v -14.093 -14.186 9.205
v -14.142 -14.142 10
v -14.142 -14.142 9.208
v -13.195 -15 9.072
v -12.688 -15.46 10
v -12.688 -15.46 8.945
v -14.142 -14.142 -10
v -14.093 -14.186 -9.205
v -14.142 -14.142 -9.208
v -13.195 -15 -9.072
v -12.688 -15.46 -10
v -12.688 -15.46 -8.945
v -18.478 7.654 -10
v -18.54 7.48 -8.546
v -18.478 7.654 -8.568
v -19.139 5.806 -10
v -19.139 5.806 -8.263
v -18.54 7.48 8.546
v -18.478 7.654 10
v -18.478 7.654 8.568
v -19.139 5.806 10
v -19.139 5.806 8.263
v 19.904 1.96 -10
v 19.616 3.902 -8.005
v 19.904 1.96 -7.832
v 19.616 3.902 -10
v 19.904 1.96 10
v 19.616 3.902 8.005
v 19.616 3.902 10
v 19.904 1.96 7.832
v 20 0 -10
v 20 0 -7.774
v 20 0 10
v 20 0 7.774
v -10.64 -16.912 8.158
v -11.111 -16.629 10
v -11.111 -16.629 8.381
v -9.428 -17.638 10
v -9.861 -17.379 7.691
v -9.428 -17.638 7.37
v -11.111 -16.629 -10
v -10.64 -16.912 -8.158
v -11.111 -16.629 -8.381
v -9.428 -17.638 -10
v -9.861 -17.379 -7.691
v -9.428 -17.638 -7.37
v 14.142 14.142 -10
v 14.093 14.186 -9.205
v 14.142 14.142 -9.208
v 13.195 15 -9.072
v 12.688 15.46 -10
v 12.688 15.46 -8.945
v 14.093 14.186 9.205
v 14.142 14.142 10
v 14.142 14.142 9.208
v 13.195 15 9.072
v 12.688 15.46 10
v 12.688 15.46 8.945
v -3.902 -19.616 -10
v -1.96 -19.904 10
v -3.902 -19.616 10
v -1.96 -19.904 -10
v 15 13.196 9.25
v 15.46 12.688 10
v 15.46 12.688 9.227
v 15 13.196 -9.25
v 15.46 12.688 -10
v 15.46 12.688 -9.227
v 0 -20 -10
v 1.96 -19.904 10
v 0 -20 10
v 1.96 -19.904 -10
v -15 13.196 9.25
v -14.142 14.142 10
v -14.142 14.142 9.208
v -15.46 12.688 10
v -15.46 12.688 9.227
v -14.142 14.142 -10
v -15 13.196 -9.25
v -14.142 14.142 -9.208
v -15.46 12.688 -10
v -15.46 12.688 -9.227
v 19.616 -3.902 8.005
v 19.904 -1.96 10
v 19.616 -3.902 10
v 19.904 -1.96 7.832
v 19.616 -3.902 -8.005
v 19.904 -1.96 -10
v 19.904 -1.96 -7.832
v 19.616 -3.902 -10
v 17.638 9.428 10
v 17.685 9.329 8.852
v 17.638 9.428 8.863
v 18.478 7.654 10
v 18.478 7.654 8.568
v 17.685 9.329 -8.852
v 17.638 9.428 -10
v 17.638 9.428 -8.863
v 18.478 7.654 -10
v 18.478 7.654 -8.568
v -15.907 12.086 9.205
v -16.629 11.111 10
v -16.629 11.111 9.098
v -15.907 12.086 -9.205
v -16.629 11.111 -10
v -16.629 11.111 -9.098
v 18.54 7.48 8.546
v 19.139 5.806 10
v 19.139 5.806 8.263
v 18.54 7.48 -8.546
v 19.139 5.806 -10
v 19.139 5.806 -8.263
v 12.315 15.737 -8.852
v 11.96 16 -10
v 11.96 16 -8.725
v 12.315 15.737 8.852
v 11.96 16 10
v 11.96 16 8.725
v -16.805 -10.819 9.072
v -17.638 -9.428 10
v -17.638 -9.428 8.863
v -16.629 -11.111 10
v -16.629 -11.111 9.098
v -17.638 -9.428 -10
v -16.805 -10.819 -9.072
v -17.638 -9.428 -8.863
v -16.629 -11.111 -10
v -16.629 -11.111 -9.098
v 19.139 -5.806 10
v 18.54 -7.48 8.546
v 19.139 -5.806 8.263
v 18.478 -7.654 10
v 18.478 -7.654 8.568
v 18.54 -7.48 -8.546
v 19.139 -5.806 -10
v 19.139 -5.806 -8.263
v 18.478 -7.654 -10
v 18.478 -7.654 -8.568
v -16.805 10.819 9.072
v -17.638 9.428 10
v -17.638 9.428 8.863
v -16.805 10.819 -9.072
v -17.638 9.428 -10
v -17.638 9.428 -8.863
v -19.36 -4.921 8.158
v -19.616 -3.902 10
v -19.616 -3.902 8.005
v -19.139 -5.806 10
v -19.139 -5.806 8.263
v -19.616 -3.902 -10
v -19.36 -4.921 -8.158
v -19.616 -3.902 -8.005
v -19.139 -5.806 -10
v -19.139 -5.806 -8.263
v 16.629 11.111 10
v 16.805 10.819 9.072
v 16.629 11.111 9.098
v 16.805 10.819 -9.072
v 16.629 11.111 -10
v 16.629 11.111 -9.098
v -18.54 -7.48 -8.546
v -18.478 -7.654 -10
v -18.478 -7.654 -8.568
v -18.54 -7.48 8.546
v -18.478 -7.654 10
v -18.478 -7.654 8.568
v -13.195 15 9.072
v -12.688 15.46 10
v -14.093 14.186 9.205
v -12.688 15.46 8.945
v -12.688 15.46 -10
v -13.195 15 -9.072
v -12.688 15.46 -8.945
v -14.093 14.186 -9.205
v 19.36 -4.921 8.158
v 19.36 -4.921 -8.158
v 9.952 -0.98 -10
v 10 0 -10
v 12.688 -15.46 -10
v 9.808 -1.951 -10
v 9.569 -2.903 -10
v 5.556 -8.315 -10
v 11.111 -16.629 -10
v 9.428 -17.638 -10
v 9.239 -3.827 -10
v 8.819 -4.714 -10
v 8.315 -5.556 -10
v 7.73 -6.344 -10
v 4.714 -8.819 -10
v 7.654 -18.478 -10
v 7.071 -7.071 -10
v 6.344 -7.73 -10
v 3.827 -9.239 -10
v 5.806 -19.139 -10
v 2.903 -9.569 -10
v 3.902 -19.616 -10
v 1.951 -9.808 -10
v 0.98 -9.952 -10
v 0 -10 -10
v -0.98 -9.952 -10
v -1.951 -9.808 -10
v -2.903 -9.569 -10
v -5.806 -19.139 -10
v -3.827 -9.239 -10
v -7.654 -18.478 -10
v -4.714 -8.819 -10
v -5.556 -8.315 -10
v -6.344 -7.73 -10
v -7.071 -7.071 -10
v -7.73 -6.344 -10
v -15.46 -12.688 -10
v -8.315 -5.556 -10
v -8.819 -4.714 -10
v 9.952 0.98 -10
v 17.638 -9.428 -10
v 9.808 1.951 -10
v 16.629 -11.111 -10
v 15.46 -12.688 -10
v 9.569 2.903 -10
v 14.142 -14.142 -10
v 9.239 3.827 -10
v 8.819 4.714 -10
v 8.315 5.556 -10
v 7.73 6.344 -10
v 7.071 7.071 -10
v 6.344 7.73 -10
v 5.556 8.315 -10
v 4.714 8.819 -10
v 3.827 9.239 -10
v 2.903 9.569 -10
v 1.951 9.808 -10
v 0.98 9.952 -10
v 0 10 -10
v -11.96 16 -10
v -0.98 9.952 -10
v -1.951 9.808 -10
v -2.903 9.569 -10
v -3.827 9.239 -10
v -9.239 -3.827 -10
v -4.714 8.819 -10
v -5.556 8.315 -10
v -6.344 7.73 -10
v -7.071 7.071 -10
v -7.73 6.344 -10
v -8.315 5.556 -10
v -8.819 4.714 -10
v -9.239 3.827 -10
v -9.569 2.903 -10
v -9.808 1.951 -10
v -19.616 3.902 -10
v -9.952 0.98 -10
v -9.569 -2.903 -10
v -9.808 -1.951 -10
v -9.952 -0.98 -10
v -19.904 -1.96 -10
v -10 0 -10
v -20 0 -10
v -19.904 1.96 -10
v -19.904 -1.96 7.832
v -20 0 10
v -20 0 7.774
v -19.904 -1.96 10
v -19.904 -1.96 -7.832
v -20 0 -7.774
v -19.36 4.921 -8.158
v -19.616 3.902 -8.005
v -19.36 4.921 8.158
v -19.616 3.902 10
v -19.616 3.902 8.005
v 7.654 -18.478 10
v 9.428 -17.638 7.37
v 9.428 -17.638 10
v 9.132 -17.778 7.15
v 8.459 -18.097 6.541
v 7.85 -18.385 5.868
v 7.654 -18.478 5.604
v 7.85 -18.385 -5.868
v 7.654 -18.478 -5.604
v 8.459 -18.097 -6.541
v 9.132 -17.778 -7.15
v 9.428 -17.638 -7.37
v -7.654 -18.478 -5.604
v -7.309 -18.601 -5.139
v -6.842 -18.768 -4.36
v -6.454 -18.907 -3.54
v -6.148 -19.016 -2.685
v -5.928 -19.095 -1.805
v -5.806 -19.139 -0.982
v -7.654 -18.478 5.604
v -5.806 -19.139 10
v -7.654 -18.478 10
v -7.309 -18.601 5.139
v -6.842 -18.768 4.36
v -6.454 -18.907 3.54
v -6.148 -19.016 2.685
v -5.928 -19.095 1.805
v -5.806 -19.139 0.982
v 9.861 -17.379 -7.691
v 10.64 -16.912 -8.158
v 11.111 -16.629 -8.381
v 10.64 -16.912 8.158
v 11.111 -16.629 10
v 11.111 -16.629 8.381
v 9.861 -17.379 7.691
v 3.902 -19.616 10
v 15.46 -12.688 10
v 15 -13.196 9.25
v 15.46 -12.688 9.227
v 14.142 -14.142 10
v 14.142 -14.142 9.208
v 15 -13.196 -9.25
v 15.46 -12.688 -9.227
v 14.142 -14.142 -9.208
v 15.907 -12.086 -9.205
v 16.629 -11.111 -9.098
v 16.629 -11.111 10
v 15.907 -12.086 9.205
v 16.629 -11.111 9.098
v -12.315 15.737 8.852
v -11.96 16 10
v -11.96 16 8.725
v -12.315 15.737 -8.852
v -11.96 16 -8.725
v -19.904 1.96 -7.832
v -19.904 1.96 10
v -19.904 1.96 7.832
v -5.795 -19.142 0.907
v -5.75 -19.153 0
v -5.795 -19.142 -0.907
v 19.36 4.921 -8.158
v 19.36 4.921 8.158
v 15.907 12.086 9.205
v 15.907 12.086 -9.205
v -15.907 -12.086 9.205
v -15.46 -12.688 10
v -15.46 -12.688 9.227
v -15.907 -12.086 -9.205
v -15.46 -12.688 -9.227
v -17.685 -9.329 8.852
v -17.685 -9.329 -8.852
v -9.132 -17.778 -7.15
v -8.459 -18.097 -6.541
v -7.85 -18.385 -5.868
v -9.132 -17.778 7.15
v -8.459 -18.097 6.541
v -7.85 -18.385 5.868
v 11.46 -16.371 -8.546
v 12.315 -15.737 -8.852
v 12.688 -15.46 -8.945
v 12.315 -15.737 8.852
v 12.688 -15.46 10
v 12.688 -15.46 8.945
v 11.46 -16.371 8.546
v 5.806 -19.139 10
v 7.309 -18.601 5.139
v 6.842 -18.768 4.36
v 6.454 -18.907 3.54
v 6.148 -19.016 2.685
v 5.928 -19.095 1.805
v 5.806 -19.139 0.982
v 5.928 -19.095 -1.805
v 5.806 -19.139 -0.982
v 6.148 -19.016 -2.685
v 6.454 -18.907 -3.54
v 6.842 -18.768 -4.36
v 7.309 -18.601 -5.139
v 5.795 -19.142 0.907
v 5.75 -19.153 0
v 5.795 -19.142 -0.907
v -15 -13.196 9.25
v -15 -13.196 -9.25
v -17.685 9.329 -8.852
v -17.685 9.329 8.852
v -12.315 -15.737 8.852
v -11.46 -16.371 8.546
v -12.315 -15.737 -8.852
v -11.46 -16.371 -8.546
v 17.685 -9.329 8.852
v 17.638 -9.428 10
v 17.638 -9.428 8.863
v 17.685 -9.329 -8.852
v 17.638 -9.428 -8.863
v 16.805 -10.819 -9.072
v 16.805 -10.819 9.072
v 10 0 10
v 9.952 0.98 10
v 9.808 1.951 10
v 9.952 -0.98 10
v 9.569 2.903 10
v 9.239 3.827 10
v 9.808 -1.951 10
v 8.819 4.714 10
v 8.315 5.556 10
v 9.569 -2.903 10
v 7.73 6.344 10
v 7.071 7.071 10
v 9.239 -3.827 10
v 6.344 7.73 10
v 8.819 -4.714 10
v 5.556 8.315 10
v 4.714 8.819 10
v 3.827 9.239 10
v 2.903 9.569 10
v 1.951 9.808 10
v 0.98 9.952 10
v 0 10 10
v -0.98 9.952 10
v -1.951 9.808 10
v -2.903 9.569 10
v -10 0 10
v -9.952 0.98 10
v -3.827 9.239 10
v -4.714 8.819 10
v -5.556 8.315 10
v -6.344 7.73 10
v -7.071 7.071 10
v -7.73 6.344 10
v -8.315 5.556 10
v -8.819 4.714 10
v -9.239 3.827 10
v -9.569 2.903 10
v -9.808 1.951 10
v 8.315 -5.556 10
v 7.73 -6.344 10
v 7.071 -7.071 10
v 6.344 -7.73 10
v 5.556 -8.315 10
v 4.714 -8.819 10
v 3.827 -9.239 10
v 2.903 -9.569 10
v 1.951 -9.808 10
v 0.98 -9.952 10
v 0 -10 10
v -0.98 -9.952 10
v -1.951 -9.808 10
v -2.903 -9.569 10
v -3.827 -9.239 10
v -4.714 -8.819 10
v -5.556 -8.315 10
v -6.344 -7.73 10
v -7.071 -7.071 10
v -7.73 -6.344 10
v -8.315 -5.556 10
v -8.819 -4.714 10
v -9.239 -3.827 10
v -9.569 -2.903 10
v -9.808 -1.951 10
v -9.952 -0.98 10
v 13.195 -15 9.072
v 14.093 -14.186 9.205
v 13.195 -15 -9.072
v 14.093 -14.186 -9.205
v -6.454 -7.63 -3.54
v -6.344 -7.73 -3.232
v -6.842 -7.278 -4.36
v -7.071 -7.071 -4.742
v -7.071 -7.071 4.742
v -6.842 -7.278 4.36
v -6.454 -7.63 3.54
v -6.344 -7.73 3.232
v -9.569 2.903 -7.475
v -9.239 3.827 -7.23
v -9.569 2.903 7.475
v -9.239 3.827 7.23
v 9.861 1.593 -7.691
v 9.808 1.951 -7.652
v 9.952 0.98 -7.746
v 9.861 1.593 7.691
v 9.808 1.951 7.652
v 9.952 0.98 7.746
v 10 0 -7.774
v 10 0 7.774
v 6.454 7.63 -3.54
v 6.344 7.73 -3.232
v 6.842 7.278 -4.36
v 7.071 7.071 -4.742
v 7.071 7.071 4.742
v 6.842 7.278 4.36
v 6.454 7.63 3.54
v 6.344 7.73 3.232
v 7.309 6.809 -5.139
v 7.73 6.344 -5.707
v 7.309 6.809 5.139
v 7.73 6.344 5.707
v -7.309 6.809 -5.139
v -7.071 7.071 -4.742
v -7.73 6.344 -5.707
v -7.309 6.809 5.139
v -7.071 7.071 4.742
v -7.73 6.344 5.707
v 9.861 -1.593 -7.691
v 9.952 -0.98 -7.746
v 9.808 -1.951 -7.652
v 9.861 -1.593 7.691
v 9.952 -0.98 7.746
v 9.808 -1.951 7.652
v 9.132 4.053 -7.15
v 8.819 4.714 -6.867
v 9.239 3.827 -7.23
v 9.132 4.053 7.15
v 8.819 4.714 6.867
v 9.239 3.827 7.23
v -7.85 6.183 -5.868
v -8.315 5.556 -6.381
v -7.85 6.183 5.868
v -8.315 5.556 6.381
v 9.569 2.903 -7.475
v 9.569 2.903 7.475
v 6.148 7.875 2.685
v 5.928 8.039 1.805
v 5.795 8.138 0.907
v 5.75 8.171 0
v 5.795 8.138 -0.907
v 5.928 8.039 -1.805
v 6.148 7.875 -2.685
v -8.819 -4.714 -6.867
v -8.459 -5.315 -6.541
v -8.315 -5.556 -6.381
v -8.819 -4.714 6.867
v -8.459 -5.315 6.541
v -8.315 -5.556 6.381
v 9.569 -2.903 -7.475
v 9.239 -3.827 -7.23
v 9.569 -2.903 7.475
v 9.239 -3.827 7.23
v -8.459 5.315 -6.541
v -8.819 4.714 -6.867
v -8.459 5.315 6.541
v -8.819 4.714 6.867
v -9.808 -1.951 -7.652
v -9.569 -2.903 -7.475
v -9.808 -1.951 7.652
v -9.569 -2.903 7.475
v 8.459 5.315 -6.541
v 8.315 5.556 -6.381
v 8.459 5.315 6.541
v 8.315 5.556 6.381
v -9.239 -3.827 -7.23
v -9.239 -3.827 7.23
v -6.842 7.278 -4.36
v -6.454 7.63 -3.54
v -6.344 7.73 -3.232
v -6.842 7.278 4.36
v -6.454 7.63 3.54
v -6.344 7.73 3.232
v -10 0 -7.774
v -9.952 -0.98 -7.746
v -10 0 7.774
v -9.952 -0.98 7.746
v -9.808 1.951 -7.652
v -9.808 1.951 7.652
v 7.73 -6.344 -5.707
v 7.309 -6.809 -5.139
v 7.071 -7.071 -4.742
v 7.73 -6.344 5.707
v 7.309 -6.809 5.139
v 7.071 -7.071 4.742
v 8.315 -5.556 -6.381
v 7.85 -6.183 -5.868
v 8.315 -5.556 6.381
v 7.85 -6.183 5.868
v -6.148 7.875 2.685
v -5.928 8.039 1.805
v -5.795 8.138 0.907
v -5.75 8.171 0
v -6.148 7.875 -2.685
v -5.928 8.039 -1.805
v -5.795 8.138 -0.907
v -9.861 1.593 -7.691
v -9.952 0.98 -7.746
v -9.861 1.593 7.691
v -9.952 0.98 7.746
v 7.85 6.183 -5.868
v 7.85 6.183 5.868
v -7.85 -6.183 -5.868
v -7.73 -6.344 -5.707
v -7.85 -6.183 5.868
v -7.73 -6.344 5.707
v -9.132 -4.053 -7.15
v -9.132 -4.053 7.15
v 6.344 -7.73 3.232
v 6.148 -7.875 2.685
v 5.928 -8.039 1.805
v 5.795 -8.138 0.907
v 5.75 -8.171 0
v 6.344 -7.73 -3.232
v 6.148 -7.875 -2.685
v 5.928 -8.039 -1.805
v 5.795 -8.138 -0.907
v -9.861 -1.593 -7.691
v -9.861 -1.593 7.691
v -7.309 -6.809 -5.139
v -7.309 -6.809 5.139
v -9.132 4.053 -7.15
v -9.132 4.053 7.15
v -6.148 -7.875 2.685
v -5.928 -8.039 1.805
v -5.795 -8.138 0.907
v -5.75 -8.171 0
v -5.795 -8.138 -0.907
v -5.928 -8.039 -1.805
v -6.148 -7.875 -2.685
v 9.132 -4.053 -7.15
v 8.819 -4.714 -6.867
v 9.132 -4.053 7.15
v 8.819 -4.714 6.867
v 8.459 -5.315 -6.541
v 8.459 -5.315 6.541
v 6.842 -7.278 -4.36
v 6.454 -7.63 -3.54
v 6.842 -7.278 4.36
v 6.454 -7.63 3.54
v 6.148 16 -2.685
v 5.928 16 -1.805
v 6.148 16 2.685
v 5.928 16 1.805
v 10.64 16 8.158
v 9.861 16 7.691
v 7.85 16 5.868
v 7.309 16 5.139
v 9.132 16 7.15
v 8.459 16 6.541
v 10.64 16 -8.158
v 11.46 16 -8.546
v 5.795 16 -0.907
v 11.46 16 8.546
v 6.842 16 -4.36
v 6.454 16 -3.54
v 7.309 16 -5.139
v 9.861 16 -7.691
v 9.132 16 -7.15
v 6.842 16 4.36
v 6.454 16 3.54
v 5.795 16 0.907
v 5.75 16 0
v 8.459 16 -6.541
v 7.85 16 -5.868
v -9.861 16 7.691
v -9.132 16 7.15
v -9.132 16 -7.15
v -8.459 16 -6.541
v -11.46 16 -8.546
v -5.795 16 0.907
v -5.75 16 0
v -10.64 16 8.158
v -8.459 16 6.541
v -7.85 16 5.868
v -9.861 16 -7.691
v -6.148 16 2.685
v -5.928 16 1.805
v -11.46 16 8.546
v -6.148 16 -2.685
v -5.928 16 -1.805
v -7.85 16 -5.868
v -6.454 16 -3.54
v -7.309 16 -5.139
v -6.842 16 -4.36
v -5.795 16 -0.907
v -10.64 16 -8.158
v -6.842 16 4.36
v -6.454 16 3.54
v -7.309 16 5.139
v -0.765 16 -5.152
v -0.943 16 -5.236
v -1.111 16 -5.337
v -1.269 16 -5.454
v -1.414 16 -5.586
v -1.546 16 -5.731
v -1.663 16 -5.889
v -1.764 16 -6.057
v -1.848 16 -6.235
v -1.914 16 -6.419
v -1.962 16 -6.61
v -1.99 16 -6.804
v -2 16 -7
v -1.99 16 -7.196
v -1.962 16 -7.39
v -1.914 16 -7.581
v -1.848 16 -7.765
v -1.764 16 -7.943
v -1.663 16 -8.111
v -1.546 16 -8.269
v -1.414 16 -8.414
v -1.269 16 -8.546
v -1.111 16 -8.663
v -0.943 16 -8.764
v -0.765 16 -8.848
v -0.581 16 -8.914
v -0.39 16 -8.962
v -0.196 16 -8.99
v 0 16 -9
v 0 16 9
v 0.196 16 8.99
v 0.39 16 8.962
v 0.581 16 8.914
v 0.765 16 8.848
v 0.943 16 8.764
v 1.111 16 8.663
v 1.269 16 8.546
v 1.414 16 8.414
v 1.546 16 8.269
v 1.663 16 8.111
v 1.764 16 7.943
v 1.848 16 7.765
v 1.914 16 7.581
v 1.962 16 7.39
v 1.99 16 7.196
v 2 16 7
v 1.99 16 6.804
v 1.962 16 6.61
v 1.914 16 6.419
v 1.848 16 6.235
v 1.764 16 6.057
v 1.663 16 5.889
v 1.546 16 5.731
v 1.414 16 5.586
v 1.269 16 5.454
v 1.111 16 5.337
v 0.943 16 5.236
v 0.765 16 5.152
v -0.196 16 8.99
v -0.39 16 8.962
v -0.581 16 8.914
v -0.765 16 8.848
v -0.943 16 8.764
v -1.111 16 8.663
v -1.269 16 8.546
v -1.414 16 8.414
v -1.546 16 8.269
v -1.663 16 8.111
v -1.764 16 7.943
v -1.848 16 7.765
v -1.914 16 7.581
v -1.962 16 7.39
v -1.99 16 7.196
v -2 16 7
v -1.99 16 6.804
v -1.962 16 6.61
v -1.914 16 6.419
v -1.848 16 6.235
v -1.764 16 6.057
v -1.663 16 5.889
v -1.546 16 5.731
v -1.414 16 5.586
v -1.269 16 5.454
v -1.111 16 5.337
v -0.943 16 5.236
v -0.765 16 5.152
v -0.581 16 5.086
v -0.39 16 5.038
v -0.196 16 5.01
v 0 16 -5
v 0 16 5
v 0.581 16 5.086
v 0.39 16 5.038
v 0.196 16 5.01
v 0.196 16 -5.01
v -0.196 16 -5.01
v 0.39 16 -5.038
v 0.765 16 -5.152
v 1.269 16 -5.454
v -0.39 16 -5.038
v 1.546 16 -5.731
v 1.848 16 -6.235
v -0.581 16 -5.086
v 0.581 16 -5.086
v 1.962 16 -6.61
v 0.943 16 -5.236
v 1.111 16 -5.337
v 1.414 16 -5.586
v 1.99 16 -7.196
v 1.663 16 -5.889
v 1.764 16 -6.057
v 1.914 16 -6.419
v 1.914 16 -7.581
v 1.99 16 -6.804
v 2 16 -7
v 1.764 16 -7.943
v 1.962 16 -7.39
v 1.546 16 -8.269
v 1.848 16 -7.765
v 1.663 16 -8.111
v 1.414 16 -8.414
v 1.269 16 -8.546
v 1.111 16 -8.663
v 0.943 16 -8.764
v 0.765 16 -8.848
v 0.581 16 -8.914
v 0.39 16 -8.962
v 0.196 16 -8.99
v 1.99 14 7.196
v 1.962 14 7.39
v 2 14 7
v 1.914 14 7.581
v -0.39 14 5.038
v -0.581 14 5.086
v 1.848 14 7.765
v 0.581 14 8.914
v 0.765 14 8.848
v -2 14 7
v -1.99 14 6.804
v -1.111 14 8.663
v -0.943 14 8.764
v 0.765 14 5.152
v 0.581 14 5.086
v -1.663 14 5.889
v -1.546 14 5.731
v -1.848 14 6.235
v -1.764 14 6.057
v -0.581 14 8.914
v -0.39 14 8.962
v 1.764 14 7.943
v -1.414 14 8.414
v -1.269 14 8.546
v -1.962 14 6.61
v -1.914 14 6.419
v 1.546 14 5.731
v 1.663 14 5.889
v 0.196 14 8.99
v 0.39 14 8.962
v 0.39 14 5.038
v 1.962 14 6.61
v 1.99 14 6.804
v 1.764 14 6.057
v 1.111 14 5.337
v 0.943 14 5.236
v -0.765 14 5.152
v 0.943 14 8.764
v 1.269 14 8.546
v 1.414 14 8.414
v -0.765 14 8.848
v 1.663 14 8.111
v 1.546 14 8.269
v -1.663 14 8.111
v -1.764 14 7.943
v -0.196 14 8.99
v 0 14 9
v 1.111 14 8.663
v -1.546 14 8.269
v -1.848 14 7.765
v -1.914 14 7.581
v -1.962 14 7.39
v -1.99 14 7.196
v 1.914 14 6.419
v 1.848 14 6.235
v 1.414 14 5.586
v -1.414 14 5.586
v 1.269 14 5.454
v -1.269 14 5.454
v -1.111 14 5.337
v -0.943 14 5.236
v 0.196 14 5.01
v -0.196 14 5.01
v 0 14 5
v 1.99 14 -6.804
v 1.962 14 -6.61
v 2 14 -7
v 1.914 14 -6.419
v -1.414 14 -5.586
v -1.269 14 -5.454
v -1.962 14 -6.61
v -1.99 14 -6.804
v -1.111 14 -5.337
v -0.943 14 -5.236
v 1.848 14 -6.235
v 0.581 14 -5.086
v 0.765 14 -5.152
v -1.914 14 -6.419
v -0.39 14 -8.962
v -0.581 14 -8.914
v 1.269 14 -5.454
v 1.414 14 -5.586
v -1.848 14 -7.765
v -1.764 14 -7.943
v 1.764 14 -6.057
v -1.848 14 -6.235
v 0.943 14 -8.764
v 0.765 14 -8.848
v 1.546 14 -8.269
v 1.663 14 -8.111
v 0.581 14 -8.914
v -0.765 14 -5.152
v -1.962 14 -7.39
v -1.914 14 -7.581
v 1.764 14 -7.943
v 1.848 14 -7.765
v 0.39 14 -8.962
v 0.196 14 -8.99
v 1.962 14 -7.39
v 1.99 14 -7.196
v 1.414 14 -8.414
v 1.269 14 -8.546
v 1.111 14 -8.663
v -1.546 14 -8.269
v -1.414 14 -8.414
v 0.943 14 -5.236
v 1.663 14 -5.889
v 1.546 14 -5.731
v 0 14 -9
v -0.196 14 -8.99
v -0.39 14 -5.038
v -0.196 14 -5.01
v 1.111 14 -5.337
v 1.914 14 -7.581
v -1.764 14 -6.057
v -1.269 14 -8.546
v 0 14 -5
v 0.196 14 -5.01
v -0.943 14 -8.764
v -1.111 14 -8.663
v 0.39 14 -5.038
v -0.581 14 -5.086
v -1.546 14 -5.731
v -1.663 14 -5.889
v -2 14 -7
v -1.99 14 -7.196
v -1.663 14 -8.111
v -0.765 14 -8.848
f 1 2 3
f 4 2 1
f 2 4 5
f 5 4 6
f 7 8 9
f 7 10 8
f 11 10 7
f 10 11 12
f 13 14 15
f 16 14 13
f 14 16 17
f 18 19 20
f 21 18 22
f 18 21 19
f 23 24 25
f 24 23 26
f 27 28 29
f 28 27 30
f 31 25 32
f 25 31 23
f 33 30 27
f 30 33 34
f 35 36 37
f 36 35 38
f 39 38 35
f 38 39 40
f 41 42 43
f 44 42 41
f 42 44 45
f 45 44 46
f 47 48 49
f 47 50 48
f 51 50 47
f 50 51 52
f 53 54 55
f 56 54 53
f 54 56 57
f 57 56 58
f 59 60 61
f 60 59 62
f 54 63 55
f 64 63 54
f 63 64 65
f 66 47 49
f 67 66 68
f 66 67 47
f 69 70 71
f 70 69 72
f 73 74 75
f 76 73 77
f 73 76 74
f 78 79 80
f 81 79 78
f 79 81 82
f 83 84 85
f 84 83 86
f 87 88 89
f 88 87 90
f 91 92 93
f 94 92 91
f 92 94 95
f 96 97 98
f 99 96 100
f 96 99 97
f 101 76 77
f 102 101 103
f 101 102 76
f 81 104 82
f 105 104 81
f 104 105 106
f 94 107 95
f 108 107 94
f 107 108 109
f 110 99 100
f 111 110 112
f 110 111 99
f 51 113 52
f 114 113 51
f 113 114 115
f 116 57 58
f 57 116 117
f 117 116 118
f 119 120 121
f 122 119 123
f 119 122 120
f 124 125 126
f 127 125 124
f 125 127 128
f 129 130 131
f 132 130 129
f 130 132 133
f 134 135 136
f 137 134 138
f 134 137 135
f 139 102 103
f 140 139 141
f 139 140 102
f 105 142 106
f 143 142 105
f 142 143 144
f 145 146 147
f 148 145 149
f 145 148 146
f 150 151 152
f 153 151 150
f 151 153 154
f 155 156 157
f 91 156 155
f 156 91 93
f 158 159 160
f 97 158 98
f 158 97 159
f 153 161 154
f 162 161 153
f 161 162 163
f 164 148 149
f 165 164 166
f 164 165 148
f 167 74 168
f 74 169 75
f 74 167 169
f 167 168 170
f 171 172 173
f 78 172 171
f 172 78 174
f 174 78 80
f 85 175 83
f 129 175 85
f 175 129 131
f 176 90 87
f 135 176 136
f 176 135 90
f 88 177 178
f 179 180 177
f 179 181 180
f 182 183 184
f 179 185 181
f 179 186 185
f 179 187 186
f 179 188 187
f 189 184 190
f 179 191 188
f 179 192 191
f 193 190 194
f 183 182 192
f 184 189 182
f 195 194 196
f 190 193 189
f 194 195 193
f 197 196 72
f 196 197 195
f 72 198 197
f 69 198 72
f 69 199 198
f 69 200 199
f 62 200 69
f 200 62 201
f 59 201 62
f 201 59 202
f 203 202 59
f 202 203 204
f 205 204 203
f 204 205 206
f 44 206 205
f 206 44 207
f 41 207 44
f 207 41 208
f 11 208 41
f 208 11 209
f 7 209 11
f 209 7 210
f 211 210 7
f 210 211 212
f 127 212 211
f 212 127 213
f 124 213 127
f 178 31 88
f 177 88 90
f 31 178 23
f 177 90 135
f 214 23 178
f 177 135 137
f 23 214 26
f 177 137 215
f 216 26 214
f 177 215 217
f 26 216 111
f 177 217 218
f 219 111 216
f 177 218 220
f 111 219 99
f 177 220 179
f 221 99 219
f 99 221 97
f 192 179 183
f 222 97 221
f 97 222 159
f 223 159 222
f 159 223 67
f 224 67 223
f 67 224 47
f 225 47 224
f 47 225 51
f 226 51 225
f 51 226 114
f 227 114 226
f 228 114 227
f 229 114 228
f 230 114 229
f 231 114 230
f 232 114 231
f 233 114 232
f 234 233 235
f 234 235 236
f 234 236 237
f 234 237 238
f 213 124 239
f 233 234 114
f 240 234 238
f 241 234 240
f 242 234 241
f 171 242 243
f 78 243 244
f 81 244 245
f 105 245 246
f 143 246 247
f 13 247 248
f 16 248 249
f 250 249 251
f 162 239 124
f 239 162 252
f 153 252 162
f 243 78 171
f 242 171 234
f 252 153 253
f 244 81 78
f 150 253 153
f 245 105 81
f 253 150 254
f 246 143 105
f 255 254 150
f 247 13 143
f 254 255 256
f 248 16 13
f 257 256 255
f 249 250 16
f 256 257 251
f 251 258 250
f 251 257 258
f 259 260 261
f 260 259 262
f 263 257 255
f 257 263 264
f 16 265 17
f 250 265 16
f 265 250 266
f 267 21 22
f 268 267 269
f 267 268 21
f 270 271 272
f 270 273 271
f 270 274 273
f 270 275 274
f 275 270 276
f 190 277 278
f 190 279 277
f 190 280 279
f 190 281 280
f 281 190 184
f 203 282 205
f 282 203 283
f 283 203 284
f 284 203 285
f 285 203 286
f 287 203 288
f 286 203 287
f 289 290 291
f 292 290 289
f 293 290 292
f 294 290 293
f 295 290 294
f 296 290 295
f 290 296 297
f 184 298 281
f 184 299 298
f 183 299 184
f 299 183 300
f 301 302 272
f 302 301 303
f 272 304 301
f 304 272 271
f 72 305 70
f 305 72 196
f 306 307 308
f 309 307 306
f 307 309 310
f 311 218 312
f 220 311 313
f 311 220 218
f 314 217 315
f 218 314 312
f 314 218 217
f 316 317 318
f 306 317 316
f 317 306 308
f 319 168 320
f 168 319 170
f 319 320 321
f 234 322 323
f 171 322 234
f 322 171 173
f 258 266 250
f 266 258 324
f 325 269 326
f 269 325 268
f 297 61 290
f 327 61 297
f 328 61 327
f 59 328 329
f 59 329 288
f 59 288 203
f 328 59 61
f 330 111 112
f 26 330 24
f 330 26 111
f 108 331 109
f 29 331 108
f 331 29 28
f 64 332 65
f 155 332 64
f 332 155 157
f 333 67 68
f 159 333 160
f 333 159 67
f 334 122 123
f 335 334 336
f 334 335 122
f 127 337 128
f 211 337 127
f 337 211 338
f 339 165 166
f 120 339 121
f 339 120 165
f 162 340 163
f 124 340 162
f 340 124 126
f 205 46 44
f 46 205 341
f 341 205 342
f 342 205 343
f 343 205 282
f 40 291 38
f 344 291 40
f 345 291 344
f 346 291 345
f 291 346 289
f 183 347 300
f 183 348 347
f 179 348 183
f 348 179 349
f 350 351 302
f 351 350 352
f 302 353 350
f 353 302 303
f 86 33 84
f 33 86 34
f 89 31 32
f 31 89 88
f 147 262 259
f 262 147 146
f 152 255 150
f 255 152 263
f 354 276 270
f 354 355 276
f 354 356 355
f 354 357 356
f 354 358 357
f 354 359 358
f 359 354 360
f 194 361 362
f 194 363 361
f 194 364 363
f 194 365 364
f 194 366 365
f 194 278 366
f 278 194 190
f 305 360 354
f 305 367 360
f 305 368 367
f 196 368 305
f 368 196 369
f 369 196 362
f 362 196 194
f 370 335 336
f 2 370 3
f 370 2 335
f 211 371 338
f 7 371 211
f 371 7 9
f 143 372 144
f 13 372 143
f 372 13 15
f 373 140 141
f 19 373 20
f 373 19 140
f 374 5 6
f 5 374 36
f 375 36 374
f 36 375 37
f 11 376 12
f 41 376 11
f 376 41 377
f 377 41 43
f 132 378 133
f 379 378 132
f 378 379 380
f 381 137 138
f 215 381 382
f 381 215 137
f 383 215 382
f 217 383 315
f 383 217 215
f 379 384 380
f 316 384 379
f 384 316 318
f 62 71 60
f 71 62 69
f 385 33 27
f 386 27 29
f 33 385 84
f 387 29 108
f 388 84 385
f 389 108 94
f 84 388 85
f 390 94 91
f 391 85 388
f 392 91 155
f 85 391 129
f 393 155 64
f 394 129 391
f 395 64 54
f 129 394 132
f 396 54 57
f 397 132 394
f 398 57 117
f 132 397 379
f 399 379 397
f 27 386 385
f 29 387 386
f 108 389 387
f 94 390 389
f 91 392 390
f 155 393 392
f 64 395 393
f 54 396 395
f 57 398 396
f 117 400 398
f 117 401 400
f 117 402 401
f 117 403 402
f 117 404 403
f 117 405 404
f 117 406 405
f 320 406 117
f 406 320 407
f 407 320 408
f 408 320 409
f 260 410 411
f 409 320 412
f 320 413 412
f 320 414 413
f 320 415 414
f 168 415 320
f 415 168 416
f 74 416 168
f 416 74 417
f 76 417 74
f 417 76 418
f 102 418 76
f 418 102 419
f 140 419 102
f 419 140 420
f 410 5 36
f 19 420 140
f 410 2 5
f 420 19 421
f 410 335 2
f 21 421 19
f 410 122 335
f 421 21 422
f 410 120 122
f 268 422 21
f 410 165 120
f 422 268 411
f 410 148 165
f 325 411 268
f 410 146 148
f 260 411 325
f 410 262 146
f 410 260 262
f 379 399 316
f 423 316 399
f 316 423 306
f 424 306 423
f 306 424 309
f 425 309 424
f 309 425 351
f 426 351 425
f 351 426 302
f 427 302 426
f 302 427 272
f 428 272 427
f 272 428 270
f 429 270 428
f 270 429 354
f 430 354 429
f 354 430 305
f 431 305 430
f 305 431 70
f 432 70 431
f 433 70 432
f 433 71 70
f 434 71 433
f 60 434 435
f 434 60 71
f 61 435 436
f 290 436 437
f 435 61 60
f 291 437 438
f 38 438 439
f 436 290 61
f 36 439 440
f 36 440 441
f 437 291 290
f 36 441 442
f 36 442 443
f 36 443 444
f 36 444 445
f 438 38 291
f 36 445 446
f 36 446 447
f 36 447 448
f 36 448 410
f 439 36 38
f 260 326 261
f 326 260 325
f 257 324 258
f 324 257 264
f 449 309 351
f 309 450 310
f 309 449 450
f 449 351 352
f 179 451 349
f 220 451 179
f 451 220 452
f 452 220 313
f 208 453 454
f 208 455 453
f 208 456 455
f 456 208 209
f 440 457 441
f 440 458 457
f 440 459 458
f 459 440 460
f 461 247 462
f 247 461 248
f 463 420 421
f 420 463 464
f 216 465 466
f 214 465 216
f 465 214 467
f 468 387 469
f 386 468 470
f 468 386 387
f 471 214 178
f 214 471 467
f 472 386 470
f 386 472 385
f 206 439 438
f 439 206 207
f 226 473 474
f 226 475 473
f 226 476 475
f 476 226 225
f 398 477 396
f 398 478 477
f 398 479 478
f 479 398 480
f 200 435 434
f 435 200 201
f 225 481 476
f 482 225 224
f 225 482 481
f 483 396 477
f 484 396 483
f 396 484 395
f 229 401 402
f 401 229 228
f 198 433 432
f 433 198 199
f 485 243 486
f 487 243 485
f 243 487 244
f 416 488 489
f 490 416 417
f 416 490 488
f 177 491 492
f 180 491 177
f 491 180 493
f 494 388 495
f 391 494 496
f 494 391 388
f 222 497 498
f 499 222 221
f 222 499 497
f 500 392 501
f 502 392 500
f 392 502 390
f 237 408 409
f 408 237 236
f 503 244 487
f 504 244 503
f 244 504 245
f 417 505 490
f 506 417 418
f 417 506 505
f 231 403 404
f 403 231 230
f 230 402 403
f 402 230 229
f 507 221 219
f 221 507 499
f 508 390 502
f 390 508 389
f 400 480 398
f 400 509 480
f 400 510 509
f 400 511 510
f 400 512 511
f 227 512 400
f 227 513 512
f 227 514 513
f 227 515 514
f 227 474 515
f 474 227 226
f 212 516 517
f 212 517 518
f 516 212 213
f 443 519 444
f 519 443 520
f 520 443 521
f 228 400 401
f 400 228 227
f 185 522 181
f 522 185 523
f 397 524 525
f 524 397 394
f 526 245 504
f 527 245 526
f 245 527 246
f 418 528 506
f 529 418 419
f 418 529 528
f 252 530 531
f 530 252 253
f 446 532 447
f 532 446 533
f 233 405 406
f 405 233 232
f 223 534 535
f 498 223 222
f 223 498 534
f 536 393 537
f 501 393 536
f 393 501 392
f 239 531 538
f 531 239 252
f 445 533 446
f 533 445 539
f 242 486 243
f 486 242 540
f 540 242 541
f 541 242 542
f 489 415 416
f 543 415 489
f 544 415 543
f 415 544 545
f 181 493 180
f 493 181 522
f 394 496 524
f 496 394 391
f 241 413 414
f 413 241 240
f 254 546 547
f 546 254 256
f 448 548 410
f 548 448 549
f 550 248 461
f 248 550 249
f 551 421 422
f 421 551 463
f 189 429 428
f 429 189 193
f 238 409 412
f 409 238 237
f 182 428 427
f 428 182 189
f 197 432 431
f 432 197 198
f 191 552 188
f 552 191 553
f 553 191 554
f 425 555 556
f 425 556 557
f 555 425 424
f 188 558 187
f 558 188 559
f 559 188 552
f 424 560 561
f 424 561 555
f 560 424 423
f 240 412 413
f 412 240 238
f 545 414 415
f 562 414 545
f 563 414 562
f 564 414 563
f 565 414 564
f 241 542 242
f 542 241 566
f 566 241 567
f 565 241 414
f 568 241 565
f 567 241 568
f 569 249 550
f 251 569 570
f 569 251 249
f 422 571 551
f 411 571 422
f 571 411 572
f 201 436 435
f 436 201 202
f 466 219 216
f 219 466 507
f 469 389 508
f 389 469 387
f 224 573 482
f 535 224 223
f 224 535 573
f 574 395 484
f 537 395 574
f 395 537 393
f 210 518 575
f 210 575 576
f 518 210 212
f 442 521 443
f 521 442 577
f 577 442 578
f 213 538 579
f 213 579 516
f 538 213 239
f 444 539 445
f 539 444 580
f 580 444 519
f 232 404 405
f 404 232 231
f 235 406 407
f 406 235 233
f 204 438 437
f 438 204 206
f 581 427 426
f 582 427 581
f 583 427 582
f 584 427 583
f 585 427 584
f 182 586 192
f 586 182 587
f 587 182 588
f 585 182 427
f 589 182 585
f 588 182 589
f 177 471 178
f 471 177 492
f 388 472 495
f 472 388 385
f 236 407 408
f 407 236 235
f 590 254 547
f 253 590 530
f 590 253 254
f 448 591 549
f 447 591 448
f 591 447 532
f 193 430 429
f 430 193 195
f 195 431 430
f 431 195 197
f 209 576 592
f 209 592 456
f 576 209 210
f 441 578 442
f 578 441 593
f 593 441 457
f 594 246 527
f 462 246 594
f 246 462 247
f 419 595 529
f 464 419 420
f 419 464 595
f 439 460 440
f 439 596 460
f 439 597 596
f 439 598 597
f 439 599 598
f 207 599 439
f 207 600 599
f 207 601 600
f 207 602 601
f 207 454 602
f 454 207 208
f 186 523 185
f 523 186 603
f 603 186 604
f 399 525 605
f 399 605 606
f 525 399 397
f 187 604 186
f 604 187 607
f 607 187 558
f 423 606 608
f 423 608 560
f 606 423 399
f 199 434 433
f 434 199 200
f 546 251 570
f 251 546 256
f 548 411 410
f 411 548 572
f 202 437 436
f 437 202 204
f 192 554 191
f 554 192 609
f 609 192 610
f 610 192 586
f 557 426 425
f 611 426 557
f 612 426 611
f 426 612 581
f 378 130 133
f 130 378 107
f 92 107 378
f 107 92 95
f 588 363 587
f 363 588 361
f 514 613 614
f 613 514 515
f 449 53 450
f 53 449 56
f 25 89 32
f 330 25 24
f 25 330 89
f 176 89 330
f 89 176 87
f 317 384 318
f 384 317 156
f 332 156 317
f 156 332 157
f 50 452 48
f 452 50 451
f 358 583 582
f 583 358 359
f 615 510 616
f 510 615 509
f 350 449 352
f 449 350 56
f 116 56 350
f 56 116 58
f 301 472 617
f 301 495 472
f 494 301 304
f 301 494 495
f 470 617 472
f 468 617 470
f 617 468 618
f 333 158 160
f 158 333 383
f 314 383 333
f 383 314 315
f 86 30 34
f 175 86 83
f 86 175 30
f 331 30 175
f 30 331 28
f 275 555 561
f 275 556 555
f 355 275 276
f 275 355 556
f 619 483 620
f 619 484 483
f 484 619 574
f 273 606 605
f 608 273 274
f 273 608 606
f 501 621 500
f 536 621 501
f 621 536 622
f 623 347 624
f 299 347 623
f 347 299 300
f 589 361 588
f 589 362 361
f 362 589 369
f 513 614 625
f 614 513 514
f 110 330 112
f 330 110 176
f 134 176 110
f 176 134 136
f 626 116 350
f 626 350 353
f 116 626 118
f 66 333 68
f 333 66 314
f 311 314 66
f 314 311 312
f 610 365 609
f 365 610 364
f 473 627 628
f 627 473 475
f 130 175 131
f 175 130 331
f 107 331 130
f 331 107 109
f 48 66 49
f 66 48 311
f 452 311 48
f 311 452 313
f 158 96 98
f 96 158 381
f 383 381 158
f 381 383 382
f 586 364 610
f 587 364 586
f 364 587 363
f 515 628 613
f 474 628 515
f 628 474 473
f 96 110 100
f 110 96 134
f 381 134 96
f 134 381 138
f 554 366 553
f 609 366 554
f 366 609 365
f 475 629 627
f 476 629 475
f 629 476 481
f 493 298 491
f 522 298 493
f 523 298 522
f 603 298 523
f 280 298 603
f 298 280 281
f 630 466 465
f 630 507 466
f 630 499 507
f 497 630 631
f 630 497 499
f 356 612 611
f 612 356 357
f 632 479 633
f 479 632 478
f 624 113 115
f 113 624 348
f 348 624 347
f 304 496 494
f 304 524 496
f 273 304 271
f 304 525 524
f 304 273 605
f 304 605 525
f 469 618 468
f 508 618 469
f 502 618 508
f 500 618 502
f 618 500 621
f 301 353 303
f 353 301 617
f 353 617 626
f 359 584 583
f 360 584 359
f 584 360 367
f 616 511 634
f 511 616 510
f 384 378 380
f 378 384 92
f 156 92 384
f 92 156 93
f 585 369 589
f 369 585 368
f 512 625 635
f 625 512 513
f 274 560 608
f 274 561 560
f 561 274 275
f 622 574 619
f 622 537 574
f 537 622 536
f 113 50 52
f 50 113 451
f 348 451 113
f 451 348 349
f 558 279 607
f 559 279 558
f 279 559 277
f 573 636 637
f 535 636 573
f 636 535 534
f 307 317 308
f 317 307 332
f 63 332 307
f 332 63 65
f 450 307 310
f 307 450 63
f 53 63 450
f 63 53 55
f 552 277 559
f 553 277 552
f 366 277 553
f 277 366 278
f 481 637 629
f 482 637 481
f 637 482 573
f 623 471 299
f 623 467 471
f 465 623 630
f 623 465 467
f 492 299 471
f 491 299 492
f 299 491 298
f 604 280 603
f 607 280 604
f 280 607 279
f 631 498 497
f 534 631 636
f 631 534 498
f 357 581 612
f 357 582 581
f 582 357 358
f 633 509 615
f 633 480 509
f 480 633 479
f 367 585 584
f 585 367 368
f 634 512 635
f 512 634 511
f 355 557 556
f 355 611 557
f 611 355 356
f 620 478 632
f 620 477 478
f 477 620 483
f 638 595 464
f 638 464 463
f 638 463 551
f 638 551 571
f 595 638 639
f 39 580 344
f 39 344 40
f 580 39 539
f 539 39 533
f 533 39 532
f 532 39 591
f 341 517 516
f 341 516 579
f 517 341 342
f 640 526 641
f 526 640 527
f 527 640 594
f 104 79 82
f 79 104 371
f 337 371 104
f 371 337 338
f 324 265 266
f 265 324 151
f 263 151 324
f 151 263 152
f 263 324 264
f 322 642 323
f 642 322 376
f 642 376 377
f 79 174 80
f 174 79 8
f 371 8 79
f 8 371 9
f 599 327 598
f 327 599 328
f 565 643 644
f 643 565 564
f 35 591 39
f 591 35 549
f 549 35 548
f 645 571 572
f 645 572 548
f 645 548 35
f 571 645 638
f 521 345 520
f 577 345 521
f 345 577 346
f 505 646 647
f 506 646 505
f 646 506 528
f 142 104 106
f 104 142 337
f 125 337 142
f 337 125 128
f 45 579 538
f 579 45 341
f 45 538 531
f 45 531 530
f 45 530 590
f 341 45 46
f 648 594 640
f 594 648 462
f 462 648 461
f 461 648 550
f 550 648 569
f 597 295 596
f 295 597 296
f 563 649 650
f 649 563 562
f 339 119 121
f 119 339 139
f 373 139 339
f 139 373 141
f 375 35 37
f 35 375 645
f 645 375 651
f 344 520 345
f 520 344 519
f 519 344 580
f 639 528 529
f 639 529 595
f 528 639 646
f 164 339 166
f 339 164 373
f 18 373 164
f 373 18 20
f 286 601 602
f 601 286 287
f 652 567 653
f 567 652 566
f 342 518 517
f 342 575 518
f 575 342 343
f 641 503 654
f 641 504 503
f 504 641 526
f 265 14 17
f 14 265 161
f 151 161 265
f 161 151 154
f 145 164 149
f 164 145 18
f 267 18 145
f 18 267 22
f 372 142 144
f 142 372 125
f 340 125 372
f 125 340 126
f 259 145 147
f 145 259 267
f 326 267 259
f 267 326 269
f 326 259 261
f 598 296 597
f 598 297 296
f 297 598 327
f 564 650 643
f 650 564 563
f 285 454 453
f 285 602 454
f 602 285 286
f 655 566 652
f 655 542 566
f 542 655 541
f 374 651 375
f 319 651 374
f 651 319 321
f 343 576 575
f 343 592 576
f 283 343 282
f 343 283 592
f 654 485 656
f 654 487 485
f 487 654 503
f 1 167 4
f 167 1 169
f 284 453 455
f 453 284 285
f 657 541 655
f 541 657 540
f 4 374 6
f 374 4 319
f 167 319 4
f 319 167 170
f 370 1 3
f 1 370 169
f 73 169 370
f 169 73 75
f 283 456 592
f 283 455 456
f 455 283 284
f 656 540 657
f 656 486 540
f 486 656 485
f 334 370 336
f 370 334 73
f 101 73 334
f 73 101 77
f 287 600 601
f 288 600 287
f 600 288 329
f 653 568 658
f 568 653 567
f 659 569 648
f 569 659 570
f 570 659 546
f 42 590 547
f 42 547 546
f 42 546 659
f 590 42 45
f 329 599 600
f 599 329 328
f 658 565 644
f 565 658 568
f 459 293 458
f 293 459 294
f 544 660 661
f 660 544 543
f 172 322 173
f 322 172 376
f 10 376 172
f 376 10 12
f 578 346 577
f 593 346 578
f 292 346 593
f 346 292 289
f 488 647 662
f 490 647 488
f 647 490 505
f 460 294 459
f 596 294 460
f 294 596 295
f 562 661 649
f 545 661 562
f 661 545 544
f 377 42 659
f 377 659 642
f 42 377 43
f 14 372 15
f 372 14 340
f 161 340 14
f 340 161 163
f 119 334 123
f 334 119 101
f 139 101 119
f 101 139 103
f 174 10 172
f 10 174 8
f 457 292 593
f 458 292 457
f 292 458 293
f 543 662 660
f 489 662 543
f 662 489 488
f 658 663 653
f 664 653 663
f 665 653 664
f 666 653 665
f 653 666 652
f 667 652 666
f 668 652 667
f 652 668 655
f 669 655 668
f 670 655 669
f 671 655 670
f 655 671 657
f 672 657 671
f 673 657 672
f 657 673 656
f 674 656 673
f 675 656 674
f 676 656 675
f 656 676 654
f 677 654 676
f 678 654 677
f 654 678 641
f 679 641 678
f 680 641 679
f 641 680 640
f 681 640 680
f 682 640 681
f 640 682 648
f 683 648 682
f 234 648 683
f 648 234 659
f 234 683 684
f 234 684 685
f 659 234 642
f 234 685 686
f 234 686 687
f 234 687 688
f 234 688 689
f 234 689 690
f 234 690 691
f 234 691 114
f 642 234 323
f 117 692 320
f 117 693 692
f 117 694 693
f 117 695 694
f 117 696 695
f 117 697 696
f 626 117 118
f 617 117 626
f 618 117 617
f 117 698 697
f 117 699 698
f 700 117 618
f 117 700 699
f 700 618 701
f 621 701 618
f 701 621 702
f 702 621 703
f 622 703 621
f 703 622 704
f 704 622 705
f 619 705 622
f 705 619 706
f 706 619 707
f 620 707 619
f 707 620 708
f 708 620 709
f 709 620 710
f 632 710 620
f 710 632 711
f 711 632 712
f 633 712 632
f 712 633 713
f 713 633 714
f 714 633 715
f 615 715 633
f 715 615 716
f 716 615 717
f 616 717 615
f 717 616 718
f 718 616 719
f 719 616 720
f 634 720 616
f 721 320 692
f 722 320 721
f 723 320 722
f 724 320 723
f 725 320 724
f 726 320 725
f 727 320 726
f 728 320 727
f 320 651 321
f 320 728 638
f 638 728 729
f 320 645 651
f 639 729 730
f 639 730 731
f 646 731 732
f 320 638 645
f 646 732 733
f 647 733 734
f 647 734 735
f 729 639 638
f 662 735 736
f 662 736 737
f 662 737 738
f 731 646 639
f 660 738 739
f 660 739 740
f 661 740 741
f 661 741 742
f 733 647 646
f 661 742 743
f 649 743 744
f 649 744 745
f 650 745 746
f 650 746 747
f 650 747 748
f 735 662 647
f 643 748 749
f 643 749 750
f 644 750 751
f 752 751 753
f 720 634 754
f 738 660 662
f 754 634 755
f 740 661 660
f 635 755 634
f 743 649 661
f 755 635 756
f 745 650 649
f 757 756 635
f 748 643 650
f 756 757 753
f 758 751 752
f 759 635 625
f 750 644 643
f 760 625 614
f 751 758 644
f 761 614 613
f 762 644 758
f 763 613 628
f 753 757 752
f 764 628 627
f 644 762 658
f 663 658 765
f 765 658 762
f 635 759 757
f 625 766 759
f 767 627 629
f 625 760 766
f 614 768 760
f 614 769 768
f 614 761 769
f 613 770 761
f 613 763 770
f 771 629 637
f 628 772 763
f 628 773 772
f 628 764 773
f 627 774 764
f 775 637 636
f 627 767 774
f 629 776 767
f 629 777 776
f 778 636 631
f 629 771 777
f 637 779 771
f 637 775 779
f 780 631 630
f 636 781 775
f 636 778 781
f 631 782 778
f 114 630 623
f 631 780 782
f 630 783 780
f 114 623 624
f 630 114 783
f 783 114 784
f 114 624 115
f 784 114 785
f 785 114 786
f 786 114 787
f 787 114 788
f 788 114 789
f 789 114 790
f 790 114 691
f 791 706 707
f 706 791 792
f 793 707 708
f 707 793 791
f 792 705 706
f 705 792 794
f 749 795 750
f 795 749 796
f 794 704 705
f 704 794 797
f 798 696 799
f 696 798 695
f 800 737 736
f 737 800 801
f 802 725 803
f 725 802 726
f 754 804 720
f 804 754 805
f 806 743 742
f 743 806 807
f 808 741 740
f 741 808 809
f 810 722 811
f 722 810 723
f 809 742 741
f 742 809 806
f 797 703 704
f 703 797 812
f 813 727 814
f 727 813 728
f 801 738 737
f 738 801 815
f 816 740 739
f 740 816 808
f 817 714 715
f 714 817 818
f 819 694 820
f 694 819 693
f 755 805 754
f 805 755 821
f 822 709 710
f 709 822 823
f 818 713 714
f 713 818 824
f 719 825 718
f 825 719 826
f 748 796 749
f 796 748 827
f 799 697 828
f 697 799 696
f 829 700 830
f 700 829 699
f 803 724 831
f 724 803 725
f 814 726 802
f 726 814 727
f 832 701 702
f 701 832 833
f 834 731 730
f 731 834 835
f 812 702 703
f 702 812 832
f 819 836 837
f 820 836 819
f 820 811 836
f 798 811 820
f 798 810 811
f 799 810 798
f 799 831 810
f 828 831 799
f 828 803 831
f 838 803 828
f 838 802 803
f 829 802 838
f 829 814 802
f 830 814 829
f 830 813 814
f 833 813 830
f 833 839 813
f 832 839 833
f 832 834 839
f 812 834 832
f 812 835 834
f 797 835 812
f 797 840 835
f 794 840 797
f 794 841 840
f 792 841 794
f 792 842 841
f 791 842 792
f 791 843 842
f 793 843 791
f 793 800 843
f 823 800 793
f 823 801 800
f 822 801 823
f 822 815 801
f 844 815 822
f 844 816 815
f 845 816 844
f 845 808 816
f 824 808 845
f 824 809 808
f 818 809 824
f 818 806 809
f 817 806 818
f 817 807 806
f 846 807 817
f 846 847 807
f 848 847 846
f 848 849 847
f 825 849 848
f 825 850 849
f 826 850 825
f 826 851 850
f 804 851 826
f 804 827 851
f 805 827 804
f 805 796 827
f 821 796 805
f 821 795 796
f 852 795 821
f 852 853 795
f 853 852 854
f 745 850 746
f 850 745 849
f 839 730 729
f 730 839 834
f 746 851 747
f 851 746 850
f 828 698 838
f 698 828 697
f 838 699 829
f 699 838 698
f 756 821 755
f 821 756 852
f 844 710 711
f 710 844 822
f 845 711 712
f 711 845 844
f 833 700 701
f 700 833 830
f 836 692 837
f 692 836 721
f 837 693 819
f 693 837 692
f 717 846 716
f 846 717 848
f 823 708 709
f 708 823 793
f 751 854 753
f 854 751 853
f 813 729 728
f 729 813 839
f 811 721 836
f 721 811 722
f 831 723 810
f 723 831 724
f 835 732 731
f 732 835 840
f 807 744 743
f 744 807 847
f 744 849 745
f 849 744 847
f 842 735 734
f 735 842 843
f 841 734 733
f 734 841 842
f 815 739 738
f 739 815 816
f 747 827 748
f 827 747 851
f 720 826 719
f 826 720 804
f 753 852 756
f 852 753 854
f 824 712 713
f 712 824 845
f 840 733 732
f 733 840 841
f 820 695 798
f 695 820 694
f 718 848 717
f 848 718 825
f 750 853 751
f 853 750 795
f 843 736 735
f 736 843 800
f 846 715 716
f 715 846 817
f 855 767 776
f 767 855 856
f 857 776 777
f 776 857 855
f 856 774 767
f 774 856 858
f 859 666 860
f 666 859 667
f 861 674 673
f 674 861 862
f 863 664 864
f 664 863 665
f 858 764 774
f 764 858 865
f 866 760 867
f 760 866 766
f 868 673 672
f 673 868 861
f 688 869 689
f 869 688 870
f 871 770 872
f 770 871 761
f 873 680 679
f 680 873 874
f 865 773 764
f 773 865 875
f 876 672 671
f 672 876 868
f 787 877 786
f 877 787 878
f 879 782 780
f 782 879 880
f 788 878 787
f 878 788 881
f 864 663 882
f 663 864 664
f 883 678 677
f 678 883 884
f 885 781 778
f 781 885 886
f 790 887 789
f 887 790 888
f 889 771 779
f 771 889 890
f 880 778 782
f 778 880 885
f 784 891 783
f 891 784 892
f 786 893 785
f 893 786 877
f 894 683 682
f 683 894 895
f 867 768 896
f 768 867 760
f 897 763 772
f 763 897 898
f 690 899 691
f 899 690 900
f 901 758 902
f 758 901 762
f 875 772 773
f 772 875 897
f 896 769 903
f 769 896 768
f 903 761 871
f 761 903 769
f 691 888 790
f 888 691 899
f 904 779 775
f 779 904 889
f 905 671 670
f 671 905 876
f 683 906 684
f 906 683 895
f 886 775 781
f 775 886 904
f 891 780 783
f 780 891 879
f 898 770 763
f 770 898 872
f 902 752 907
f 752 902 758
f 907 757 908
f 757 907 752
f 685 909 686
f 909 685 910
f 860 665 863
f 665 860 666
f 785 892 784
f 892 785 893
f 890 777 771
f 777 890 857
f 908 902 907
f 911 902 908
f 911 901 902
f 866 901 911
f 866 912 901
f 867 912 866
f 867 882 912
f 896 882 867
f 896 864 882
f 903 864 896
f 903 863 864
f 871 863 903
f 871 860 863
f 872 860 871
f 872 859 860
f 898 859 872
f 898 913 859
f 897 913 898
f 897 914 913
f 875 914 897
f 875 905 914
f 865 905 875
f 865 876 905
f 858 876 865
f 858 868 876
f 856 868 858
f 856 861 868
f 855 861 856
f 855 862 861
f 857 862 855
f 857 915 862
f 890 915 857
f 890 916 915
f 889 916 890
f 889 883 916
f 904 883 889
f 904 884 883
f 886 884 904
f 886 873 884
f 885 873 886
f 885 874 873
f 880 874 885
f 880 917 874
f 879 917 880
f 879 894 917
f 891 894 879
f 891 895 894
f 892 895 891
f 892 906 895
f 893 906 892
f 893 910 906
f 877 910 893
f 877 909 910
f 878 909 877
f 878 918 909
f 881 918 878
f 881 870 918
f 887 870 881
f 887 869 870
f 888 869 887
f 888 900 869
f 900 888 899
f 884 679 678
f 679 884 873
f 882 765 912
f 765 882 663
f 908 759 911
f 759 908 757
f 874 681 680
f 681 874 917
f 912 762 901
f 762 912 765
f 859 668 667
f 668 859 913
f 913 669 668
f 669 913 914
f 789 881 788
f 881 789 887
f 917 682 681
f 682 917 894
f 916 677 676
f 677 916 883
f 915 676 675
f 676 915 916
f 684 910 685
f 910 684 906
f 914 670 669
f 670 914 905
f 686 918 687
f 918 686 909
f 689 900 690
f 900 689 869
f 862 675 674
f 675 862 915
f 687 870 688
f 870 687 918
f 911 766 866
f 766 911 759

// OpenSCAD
// COBRA Vertebra - T5 V11
// Height: 20.0mm, OD: 40.0mm

$fn = 64;

difference() {
    // Outer cylinder
    cylinder(h=20.0, d=40.0, center=true);
    
    // Inner channel
    cylinder(h=22.0, d=20.0, center=true);

    // Battery cavity 1
    rotate([0, 0, 0])
    translate([15.0, 0, 0])
    rotate([90, 0, 0])
    cylinder(h=74.0, d=18.5, center=true);

    // Battery cavity 2
    rotate([0, 0, 180])
    translate([15.0, 0, 0])
    rotate([90, 0, 0])
    cylinder(h=74.0, d=18.5, center=true);

    // Solar panel cavity
    translate([0, 18.0, 0])
    cube([50, 4, 30], center=true);

    // Pivot holes
    translate([0, 20.0, 7.0])
    rotate([90, 0, 0])
    cylinder(h=12.0, d=4, center=true);
    
    translate([0, 20.0, -7.0])
    rotate([90, 0, 0])
    cylinder(h=12.0, d=4, center=true);
}
